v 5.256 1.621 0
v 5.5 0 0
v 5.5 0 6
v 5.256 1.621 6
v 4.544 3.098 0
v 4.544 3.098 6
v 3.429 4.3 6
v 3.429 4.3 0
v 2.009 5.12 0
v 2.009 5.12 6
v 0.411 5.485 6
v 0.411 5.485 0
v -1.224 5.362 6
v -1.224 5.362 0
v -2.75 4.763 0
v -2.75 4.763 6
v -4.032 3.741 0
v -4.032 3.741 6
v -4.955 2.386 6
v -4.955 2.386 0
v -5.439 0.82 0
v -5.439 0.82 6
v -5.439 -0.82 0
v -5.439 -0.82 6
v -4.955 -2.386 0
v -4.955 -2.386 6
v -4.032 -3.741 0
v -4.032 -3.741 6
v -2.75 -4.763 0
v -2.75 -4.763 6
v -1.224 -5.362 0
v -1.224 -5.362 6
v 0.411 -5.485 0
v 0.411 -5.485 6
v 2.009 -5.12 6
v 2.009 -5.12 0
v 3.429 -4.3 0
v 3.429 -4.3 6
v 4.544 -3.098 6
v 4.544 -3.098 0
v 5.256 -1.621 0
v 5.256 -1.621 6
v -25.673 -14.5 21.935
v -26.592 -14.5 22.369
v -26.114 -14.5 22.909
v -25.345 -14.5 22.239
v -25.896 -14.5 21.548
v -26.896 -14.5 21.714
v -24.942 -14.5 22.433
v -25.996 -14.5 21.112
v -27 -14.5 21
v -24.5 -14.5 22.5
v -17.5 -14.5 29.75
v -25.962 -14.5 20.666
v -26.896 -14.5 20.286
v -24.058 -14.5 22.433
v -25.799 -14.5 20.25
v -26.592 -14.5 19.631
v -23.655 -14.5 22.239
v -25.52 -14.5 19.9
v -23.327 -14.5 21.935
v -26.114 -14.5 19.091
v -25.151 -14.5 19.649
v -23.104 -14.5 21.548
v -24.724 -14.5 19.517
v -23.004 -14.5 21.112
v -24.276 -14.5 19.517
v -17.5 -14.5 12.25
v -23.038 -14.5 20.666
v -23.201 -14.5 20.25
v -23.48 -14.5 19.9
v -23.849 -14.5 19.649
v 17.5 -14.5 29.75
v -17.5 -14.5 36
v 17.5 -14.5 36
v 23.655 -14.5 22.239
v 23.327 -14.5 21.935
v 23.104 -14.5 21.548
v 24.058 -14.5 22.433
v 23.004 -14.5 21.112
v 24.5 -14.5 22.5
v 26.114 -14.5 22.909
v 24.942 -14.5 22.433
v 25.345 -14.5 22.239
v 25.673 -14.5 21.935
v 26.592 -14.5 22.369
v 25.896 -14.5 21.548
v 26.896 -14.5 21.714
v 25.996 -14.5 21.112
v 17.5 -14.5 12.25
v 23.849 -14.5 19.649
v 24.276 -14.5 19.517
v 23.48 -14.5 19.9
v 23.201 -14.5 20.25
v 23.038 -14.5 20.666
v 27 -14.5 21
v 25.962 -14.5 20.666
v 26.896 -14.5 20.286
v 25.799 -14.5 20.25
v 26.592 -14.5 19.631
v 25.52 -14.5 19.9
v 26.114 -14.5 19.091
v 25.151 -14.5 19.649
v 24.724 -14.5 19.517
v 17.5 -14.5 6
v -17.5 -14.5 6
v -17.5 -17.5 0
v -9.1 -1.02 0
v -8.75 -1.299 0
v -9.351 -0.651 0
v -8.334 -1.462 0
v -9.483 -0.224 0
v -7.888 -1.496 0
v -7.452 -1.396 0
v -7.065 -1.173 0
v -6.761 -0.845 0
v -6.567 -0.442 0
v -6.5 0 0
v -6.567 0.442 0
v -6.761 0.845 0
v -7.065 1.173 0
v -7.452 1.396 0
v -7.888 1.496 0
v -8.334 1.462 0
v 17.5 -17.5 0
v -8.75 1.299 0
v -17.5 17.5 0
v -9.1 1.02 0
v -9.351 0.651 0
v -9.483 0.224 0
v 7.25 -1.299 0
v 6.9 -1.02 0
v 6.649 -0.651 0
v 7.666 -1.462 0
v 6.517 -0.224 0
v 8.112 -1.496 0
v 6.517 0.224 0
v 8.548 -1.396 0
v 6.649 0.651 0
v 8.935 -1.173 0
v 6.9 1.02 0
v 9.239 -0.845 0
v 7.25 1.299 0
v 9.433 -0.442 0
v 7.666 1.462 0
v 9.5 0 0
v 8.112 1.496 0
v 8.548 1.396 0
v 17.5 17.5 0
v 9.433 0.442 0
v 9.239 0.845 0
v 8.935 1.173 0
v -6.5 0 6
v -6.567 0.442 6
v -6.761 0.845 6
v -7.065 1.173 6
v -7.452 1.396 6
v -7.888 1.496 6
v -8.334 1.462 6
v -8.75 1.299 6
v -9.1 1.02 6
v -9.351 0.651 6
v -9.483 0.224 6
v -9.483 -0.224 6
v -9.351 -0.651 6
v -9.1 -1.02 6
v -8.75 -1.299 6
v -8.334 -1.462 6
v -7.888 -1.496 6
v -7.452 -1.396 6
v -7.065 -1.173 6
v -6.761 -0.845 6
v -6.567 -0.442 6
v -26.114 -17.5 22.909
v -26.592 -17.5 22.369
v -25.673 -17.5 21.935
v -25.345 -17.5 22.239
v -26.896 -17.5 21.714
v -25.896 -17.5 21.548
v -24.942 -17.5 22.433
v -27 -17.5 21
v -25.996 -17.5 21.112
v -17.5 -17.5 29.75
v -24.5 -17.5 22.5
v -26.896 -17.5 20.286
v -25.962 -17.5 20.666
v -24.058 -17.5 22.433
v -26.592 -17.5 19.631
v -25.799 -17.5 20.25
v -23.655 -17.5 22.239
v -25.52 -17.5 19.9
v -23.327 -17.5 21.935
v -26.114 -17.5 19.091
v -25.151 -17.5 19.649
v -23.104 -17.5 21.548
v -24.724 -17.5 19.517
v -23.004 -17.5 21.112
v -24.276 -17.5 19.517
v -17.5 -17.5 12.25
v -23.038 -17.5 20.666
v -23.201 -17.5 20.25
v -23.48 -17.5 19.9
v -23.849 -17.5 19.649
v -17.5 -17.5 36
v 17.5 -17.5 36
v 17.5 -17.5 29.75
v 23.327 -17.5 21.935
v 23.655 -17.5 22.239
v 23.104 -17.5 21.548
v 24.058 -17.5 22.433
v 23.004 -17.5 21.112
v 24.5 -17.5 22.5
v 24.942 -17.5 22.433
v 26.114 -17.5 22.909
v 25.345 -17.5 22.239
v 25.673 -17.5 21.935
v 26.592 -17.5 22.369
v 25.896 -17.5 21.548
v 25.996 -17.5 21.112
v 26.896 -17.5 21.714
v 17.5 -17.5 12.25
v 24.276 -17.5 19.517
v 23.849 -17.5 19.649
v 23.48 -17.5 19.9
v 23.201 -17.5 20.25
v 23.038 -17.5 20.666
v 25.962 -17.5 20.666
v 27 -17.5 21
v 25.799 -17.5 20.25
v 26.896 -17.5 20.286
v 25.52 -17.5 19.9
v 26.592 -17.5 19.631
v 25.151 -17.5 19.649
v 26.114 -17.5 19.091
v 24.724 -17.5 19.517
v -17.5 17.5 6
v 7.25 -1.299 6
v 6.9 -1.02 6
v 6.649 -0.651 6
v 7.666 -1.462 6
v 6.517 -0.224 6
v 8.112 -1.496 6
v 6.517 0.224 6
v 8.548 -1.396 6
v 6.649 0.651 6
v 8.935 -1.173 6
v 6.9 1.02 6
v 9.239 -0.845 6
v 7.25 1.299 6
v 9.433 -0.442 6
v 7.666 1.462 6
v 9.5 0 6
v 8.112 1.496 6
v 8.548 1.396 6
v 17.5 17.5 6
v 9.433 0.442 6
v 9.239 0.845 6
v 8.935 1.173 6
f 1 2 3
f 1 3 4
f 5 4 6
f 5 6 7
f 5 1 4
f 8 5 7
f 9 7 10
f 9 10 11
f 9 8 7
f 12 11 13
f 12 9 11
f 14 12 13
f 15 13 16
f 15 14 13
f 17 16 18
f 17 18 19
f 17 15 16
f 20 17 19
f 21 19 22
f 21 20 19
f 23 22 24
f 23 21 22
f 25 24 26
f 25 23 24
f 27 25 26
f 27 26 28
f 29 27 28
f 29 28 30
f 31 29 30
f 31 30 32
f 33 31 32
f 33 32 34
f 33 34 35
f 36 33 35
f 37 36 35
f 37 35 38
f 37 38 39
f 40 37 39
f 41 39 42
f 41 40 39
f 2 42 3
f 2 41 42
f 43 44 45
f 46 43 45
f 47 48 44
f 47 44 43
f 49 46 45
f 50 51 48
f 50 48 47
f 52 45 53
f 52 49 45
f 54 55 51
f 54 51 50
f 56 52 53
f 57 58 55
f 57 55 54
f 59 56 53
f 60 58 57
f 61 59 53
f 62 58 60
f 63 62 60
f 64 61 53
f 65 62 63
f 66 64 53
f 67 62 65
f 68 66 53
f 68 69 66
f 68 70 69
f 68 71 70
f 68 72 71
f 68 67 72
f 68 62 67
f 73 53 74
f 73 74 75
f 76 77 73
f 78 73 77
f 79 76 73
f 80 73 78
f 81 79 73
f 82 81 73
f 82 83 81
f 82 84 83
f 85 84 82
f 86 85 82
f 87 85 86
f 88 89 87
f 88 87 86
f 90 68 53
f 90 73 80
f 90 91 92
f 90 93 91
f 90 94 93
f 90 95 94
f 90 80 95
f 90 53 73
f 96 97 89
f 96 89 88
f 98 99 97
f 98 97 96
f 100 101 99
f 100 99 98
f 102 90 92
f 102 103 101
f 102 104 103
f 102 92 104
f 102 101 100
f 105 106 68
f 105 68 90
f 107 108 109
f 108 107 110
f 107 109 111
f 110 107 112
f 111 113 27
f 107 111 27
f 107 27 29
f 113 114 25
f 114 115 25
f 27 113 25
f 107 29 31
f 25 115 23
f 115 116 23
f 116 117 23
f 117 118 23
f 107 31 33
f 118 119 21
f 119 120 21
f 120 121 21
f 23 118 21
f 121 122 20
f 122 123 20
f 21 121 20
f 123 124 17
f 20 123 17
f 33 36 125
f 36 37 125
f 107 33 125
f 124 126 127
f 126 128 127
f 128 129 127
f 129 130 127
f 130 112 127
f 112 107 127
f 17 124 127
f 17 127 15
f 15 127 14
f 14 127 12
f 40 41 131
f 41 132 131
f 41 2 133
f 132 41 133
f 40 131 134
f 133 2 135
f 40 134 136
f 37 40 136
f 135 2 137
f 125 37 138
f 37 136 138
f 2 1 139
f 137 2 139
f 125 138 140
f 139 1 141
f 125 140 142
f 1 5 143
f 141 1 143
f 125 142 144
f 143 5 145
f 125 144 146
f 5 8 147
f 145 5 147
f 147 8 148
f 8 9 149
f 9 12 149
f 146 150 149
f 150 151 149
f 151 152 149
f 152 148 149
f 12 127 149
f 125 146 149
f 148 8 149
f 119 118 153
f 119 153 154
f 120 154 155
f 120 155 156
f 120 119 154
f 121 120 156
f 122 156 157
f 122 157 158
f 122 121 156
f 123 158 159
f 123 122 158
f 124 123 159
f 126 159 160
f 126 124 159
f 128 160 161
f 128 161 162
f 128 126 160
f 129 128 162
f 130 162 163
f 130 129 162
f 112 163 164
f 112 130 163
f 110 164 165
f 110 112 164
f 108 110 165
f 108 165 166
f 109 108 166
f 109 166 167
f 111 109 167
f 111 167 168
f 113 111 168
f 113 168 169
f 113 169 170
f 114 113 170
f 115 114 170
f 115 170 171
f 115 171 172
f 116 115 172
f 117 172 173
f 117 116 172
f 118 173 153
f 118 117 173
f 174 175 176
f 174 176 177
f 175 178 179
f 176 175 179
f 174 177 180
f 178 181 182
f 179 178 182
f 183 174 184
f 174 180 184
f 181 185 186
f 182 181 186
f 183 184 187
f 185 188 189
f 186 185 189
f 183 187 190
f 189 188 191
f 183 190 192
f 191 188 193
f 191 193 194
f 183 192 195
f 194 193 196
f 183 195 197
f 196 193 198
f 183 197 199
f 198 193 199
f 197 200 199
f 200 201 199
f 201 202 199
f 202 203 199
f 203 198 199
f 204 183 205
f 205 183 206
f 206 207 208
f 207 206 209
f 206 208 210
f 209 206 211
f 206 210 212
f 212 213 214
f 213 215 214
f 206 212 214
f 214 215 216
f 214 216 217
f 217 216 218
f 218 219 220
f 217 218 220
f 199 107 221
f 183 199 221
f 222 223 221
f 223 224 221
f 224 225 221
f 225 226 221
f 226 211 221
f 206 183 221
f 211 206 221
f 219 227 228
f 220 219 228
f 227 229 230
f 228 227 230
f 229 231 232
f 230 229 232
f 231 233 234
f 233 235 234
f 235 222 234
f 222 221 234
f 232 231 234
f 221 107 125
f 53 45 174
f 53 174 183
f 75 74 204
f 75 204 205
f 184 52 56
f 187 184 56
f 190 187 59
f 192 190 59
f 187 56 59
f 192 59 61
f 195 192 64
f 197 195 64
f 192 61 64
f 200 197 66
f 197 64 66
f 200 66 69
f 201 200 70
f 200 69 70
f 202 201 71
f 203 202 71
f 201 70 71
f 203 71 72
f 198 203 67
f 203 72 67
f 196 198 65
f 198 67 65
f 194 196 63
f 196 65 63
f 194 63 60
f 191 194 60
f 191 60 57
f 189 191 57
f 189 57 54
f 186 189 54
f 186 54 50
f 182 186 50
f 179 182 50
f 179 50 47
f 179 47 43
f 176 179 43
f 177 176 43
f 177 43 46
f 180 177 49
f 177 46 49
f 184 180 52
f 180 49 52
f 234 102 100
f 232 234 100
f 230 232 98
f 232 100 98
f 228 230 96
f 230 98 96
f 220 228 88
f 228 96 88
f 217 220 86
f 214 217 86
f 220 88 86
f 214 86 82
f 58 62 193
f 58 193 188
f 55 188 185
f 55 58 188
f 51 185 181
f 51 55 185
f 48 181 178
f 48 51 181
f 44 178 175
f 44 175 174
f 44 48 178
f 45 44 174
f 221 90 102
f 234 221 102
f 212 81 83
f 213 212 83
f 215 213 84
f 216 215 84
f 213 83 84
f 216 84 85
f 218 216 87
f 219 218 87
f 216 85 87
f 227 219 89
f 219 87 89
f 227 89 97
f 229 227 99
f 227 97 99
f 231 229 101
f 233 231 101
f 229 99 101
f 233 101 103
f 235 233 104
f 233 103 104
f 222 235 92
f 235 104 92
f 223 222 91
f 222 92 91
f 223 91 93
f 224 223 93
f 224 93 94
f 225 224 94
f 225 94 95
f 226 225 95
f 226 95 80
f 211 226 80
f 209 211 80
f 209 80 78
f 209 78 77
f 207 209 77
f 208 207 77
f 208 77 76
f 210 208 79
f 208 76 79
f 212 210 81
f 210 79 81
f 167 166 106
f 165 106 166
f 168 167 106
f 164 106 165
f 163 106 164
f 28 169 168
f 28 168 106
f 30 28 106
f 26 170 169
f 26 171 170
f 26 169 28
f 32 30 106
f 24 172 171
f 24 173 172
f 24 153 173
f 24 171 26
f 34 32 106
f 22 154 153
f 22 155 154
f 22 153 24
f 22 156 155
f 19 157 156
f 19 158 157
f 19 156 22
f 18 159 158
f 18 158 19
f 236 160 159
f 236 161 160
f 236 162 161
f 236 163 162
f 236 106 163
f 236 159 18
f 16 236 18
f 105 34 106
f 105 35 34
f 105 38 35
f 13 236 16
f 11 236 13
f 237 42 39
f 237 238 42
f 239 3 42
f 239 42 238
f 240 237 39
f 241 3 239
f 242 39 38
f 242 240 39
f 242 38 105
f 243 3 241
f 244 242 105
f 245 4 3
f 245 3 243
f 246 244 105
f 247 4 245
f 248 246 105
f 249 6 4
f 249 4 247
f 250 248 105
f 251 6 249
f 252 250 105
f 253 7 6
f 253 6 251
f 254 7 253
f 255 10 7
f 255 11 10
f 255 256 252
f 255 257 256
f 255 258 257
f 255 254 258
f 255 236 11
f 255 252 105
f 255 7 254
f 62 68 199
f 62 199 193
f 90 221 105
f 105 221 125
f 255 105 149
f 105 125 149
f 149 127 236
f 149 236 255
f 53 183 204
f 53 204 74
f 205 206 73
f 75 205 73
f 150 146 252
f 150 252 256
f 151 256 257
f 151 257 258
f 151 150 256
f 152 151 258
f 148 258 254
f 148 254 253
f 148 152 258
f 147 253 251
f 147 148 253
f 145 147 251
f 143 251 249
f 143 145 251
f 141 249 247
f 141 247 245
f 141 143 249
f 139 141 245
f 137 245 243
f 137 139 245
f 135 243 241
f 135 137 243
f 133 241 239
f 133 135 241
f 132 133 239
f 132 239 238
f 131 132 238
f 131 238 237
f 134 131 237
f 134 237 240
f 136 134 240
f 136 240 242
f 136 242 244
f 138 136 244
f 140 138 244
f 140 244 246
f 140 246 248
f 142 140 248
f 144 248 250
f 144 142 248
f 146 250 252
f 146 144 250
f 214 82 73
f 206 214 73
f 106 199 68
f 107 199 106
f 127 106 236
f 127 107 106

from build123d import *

# Parameters (mm, degrees)
SKETCH1_W           = 35
SKETCH1_H           = 35
SKETCH1_R           = 5.5
SKETCH1_R_2         = 1.5
BOSS_EXTRUDE1_DEPTH = 6
SKETCH2_W           = 35
SKETCH2_H           = 3
BOSS_EXTRUDE2_DEPTH = 30
SKETCH3_R           = 1.5
BOSS_EXTRUDE3_DEPTH = 3


with BuildPart() as part:
    # Sketch1 → Boss-Extrude1 (new body)
    with BuildSketch(Plane.XY):
        Rectangle(SKETCH1_W, SKETCH1_H)
        Circle(SKETCH1_R, mode=Mode.SUBTRACT)
        with Locations((8, 0)):
            Circle(SKETCH1_R_2, mode=Mode.SUBTRACT)
        with Locations((-8, 0)):
            Circle(SKETCH1_R_2, mode=Mode.SUBTRACT)
    extrude(amount=BOSS_EXTRUDE1_DEPTH)

    # Sketch2 → Boss-Extrude2 (add)
    with BuildSketch(Plane.XY.offset(6)):
        with Locations((0, -16)):
            Rectangle(SKETCH2_W, SKETCH2_H)
    extrude(amount=BOSS_EXTRUDE2_DEPTH)

    # Sketch3 → Boss-Extrude3 (add)
    # profile 1 of 2: a face of its own
    with BuildSketch(Plane(origin=(0, -14.5, 0), x_dir=(1, 0, 0), z_dir=(0, 1, 0))):
        with BuildLine():
            Line((17.5, -29.75), (17.5, -12.25))
            Line((17.5, -12.25), (26.114080353, -19.090878575))
            ThreePointArc((26.114080353, -19.090878575), (27, -21), (26.114080353, -22.909121425))
            Line((26.114080353, -22.909121425), (17.5, -29.75))
        make_face()
        with Locations(Location((24.5, -21, 0), (0, 0, 270))):
            Circle(SKETCH3_R, mode=Mode.SUBTRACT)
    # profile 2 of 2: a face of its own
    with BuildSketch(Plane(origin=(0, -14.5, 0), x_dir=(1, 0, 0), z_dir=(0, 1, 0))):
        with BuildLine():
            Line((-17.5, -29.75), (-17.5, -12.25))
            Line((-17.5, -12.25), (-26.114080353, -19.090878575))
            ThreePointArc((-26.114080353, -19.090878575), (-27, -21), (-26.114080353, -22.909121425))
            Line((-26.114080353, -22.909121425), (-17.5, -29.75))
        make_face()
        with Locations(Location((-24.5, -21, 0), (0, 0, 270))):
            Circle(SKETCH3_R, mode=Mode.SUBTRACT)
    extrude(amount=-BOSS_EXTRUDE3_DEPTH)


solid = part.part
